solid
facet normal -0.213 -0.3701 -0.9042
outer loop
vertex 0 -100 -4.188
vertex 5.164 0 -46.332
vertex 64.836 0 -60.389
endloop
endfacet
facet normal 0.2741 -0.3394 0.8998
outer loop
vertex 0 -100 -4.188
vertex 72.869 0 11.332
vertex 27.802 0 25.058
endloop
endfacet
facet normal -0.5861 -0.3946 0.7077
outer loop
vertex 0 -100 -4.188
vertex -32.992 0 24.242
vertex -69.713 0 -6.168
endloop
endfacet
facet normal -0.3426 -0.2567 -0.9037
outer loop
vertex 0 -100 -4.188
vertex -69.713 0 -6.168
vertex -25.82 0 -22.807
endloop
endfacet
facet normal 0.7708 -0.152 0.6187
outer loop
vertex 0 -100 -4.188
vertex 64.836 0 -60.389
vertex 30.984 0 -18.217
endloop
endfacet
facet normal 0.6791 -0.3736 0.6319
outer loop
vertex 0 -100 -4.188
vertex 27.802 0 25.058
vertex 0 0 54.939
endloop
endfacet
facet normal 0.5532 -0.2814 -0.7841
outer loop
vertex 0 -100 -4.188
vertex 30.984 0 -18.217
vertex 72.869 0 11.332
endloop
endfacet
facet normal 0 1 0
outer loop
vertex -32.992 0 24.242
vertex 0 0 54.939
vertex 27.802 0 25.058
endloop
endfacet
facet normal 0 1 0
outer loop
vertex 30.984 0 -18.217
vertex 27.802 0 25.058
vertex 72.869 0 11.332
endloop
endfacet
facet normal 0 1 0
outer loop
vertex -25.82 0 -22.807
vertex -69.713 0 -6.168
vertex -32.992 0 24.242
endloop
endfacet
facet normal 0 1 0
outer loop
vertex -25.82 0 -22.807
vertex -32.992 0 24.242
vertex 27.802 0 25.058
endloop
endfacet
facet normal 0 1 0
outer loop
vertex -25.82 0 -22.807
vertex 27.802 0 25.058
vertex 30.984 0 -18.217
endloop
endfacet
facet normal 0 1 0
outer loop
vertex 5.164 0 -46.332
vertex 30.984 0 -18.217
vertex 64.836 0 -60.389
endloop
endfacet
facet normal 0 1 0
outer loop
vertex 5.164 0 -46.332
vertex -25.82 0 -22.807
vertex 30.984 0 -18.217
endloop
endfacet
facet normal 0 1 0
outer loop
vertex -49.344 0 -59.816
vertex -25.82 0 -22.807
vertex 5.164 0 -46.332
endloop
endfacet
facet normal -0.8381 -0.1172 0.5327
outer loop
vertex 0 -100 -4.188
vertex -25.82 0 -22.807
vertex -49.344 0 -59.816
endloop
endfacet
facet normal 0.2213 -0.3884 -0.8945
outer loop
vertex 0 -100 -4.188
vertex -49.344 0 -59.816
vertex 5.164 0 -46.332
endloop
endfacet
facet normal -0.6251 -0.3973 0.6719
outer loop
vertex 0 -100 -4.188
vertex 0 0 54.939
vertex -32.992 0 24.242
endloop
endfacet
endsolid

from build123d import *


with BuildPart() as f3:
    # F0 (on Front) → F3 section 0
    with BuildSketch(Plane.XZ, mode=Mode.PRIVATE) as f3_s0:
        Polygon((0, 54.938529), (-32.991804, 24.241803), (-69.713116, -6.168033), (-25.819672, -22.807376), (-49.344264, -59.815578), (5.163935, -46.331968), (64.83607, -60.389347), (30.983604, -18.217213), (72.868854, 11.331968), (27.801723, 25.058175), align=None)
    loft([f3_s0.sketch, Vertex(0, -100, -4.188326)])


solid = f3.part
